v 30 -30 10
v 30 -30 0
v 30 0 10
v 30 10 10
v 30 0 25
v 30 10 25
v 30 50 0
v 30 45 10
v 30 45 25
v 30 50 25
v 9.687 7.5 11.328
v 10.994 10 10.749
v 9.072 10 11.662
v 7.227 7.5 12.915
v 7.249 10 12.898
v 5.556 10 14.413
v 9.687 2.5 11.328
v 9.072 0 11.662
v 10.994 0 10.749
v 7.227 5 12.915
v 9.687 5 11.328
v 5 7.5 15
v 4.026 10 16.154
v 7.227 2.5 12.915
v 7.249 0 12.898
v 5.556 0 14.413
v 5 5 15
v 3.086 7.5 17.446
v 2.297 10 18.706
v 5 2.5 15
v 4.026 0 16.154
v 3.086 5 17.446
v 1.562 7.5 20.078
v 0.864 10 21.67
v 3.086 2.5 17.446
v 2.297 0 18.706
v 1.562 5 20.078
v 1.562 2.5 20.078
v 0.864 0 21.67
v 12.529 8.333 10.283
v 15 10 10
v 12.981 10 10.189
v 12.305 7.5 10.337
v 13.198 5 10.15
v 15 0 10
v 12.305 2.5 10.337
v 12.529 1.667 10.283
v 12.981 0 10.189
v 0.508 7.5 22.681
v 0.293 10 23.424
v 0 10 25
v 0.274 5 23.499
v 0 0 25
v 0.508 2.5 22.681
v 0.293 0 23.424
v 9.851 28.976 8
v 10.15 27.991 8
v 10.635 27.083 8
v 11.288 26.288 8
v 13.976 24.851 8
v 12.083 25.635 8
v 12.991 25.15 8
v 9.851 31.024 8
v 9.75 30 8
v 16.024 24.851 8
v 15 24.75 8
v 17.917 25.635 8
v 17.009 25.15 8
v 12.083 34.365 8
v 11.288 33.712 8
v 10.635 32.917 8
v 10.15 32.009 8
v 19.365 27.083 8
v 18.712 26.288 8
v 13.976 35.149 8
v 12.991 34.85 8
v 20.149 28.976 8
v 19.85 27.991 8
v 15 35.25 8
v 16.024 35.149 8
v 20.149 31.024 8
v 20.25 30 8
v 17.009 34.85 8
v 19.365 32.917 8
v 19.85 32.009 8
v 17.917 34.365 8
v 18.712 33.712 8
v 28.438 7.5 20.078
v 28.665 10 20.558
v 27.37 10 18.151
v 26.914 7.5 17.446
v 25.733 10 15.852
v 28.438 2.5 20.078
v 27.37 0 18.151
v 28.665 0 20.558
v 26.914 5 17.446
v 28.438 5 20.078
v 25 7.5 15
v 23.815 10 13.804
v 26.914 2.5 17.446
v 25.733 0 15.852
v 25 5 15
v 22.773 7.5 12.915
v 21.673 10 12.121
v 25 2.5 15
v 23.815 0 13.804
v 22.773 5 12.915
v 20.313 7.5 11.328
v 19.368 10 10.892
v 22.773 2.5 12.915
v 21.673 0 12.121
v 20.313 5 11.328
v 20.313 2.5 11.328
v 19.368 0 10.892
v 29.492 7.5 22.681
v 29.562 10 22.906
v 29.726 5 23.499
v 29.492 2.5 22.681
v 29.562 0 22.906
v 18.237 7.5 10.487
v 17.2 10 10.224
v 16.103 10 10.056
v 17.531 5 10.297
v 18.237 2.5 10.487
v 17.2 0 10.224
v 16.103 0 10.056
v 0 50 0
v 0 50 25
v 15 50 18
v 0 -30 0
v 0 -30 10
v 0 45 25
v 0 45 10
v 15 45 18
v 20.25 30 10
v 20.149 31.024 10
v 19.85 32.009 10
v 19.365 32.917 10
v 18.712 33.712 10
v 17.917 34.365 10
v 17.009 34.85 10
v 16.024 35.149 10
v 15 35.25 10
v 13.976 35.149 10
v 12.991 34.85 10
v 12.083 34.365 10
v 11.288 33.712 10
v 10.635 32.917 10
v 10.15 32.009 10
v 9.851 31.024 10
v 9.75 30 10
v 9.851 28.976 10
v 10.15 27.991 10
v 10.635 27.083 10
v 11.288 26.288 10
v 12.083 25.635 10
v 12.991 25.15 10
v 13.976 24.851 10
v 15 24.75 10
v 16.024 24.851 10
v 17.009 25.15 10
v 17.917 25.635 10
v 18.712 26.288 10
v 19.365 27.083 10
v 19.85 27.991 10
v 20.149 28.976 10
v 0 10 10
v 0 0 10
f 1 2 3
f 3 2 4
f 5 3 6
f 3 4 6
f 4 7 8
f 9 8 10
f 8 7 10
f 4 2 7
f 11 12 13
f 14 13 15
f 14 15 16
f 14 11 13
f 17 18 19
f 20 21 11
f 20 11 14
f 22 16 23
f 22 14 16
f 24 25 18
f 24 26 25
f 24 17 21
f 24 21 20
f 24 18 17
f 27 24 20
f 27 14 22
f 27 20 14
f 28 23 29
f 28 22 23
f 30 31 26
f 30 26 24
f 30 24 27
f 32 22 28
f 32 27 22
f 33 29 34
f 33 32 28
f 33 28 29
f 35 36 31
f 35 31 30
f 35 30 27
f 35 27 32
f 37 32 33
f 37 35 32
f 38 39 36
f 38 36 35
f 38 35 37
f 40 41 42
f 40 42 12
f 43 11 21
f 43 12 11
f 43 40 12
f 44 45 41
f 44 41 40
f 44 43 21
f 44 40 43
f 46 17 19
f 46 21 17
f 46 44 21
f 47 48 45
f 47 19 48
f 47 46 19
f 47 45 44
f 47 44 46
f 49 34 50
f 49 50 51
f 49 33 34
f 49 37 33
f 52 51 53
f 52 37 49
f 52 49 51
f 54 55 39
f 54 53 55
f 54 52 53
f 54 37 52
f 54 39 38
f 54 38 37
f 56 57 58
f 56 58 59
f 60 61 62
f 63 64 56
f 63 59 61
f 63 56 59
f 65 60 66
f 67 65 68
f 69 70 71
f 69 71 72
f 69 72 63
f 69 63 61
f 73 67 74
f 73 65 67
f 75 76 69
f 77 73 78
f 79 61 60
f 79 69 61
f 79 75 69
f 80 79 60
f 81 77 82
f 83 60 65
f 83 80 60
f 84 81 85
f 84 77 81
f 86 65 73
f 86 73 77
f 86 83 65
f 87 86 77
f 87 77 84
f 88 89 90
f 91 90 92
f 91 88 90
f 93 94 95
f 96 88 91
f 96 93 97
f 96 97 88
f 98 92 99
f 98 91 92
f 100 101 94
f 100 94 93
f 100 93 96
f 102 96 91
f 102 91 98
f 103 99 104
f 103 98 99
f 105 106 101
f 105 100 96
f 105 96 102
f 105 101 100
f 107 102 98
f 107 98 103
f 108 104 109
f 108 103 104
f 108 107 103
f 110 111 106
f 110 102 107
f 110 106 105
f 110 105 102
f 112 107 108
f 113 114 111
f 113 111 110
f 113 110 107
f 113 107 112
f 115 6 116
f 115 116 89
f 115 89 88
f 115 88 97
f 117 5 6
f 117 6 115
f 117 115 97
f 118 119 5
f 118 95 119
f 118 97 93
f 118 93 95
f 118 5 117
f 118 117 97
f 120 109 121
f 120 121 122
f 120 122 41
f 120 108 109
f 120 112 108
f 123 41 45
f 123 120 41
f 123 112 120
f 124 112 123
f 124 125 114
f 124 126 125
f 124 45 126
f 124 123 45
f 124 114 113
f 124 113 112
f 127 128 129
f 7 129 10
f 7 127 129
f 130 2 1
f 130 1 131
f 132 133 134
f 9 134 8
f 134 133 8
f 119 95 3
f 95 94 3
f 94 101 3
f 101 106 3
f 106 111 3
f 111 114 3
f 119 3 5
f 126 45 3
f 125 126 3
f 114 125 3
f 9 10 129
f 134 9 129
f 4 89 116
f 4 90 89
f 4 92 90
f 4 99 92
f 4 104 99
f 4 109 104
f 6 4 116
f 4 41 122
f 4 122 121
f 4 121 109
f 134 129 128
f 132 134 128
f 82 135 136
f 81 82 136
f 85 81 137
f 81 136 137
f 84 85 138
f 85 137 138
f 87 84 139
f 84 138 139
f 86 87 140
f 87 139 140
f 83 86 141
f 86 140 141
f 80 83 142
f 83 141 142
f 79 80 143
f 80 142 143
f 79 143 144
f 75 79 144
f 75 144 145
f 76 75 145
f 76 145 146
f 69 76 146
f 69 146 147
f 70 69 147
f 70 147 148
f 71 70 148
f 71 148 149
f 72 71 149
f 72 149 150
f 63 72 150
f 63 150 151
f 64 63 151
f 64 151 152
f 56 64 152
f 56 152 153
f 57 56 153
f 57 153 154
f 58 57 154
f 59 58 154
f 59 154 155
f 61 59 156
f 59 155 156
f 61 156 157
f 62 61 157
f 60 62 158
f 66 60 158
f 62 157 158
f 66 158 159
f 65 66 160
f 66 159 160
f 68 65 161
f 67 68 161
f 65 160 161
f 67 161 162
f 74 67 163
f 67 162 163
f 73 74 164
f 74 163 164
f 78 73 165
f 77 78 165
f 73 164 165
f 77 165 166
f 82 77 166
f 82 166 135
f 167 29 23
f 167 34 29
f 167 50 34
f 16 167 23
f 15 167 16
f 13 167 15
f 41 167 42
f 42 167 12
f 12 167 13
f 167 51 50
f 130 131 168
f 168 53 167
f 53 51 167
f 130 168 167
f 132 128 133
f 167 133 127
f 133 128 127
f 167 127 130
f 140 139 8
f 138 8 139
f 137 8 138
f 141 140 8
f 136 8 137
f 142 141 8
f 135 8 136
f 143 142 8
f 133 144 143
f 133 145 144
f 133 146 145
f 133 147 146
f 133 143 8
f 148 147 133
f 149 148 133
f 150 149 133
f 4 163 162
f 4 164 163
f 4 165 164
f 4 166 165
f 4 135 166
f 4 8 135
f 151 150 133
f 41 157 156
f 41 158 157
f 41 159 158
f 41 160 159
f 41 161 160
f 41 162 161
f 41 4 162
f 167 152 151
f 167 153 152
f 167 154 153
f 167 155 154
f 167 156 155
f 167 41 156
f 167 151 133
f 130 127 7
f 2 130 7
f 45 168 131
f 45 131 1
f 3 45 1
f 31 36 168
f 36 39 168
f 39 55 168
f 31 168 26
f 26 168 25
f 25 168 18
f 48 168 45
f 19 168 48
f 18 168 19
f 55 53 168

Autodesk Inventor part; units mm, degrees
ref_plane "YZ Plane" through (0, 0, 0) normal (1, 0, 0) x (0, 1, 0)
ref_plane "XZ Plane" through (0, 0, 0) normal (0, 1, 0) x (-1, 0, 0)
ref_plane "XY Plane" through (0, 0, 0) normal (0, 0, 1) x (1, 0, 0)
sketch "Sketch1" plane through (0, 0, 0) normal (0, 0, 1) x (1, 0, 0)
  line L0 (0, 0) -> (30, 0)
  line L1 (30, 0) -> (30, -30)
  line L2 (30, -30) -> (0, -30)
  line L3 (0, -30) -> (0, 0)
  dimension "d2" = 30
  dimension "d3" = 30
extrude "Extrusion1" add sketch "Sketch1" along normal blind 10
sketch "Sketch2" plane through (0, 0, 0) normal (0, 1, 0) x (1, 0, 0)
  line L0 (30, -10) -> (0, -10) projected
  line L1 (30, -10) -> (30, -25)
  line L2 (0, 0) -> (0, -10) projected
  line L3 (0, -25) -> (0, -10)
  spline S0 degree 4 poles (30, -25) (29.1667, -16.6667) (15, 3.8889) (0.8333, -16.6667) (0, -25) knots 0 0 0 0 0 1 1 1 1 1
  line L4 (15, -10) -> (30, -10) construction
  line L5 (15, -10) -> (0, -10) construction
  line L6 (0, -10) -> (5, -15) construction
  line L7 (5, -15) -> (25, -15) construction
  line L8 (30, -10) -> (25, -15) construction
  point P0 (24.1347, -10)
  point P1 (8.1347, -10)
  point P2 (15, -10)
  point P3 (0, -25)
  point P4 (30, -25)
  dimension "d16" = 15
  dimension "d18" = 0
  dimension "d19" = 5
  dimension "d20" = 5
extrude "Extrusion2" add sketch "Sketch2" along normal blind 10
sketch "Sketch3" plane through (0, 0, 0) normal (0, 1, 0) x (1, 0, 0)
  line L0 (0, 0) -> (30, 0) projected
  line L1 (0, 0) -> (0, -10) projected
  line L2 (30, 0) -> (30, -10) projected
  line L3 (15, -10) -> (0, -10) projected
  line L4 (30, -10) -> (15, -10) projected
extrude "Extrusion3" add sketch "Sketch3" along normal blind 50
sketch "Sketch4" plane through (0, 50, 0) normal (0, 1, 0) x (1, 0, 0)
  line L0 (30, -10) -> (30, -25)
  line L1 (30, -25) -> (15, -18)
  line L2 (15, -18) -> (0, -25)
  line L3 (0, -25) -> (0, -10)
  line L4 (0, -10) -> (30, -10) projected
  line L5 (30, -10) -> (0, -10)
  dimension "d27" = 8
  dimension "d28" = 15
extrude "Extrusion4" add sketch "Sketch4" against normal blind 5
sketch "Sketch5" plane through (0, 10, 10) normal (0, 0, 1) x (1, 0, 0)
  circle A0 centre (15, 20) radius 5.25
  line L0 (15, 20) -> (30, 20) construction
  line L1 (15, 20) -> (0, 20) construction
  line L2 (30, 0) -> (30, 35) construction
  line L3 (0, 0) -> (0, 35) construction
  line L4 (15, 0) -> (0, 0) construction
  point P0 (0, -10)
  point P1 (30, 40)
  point P2 (0, 40)
  dimension "d21" = 10.5
  dimension "d22" = 20
extrude "Extrusion5" cut sketch "Sketch5" against normal blind 2
properties part number "stand"
